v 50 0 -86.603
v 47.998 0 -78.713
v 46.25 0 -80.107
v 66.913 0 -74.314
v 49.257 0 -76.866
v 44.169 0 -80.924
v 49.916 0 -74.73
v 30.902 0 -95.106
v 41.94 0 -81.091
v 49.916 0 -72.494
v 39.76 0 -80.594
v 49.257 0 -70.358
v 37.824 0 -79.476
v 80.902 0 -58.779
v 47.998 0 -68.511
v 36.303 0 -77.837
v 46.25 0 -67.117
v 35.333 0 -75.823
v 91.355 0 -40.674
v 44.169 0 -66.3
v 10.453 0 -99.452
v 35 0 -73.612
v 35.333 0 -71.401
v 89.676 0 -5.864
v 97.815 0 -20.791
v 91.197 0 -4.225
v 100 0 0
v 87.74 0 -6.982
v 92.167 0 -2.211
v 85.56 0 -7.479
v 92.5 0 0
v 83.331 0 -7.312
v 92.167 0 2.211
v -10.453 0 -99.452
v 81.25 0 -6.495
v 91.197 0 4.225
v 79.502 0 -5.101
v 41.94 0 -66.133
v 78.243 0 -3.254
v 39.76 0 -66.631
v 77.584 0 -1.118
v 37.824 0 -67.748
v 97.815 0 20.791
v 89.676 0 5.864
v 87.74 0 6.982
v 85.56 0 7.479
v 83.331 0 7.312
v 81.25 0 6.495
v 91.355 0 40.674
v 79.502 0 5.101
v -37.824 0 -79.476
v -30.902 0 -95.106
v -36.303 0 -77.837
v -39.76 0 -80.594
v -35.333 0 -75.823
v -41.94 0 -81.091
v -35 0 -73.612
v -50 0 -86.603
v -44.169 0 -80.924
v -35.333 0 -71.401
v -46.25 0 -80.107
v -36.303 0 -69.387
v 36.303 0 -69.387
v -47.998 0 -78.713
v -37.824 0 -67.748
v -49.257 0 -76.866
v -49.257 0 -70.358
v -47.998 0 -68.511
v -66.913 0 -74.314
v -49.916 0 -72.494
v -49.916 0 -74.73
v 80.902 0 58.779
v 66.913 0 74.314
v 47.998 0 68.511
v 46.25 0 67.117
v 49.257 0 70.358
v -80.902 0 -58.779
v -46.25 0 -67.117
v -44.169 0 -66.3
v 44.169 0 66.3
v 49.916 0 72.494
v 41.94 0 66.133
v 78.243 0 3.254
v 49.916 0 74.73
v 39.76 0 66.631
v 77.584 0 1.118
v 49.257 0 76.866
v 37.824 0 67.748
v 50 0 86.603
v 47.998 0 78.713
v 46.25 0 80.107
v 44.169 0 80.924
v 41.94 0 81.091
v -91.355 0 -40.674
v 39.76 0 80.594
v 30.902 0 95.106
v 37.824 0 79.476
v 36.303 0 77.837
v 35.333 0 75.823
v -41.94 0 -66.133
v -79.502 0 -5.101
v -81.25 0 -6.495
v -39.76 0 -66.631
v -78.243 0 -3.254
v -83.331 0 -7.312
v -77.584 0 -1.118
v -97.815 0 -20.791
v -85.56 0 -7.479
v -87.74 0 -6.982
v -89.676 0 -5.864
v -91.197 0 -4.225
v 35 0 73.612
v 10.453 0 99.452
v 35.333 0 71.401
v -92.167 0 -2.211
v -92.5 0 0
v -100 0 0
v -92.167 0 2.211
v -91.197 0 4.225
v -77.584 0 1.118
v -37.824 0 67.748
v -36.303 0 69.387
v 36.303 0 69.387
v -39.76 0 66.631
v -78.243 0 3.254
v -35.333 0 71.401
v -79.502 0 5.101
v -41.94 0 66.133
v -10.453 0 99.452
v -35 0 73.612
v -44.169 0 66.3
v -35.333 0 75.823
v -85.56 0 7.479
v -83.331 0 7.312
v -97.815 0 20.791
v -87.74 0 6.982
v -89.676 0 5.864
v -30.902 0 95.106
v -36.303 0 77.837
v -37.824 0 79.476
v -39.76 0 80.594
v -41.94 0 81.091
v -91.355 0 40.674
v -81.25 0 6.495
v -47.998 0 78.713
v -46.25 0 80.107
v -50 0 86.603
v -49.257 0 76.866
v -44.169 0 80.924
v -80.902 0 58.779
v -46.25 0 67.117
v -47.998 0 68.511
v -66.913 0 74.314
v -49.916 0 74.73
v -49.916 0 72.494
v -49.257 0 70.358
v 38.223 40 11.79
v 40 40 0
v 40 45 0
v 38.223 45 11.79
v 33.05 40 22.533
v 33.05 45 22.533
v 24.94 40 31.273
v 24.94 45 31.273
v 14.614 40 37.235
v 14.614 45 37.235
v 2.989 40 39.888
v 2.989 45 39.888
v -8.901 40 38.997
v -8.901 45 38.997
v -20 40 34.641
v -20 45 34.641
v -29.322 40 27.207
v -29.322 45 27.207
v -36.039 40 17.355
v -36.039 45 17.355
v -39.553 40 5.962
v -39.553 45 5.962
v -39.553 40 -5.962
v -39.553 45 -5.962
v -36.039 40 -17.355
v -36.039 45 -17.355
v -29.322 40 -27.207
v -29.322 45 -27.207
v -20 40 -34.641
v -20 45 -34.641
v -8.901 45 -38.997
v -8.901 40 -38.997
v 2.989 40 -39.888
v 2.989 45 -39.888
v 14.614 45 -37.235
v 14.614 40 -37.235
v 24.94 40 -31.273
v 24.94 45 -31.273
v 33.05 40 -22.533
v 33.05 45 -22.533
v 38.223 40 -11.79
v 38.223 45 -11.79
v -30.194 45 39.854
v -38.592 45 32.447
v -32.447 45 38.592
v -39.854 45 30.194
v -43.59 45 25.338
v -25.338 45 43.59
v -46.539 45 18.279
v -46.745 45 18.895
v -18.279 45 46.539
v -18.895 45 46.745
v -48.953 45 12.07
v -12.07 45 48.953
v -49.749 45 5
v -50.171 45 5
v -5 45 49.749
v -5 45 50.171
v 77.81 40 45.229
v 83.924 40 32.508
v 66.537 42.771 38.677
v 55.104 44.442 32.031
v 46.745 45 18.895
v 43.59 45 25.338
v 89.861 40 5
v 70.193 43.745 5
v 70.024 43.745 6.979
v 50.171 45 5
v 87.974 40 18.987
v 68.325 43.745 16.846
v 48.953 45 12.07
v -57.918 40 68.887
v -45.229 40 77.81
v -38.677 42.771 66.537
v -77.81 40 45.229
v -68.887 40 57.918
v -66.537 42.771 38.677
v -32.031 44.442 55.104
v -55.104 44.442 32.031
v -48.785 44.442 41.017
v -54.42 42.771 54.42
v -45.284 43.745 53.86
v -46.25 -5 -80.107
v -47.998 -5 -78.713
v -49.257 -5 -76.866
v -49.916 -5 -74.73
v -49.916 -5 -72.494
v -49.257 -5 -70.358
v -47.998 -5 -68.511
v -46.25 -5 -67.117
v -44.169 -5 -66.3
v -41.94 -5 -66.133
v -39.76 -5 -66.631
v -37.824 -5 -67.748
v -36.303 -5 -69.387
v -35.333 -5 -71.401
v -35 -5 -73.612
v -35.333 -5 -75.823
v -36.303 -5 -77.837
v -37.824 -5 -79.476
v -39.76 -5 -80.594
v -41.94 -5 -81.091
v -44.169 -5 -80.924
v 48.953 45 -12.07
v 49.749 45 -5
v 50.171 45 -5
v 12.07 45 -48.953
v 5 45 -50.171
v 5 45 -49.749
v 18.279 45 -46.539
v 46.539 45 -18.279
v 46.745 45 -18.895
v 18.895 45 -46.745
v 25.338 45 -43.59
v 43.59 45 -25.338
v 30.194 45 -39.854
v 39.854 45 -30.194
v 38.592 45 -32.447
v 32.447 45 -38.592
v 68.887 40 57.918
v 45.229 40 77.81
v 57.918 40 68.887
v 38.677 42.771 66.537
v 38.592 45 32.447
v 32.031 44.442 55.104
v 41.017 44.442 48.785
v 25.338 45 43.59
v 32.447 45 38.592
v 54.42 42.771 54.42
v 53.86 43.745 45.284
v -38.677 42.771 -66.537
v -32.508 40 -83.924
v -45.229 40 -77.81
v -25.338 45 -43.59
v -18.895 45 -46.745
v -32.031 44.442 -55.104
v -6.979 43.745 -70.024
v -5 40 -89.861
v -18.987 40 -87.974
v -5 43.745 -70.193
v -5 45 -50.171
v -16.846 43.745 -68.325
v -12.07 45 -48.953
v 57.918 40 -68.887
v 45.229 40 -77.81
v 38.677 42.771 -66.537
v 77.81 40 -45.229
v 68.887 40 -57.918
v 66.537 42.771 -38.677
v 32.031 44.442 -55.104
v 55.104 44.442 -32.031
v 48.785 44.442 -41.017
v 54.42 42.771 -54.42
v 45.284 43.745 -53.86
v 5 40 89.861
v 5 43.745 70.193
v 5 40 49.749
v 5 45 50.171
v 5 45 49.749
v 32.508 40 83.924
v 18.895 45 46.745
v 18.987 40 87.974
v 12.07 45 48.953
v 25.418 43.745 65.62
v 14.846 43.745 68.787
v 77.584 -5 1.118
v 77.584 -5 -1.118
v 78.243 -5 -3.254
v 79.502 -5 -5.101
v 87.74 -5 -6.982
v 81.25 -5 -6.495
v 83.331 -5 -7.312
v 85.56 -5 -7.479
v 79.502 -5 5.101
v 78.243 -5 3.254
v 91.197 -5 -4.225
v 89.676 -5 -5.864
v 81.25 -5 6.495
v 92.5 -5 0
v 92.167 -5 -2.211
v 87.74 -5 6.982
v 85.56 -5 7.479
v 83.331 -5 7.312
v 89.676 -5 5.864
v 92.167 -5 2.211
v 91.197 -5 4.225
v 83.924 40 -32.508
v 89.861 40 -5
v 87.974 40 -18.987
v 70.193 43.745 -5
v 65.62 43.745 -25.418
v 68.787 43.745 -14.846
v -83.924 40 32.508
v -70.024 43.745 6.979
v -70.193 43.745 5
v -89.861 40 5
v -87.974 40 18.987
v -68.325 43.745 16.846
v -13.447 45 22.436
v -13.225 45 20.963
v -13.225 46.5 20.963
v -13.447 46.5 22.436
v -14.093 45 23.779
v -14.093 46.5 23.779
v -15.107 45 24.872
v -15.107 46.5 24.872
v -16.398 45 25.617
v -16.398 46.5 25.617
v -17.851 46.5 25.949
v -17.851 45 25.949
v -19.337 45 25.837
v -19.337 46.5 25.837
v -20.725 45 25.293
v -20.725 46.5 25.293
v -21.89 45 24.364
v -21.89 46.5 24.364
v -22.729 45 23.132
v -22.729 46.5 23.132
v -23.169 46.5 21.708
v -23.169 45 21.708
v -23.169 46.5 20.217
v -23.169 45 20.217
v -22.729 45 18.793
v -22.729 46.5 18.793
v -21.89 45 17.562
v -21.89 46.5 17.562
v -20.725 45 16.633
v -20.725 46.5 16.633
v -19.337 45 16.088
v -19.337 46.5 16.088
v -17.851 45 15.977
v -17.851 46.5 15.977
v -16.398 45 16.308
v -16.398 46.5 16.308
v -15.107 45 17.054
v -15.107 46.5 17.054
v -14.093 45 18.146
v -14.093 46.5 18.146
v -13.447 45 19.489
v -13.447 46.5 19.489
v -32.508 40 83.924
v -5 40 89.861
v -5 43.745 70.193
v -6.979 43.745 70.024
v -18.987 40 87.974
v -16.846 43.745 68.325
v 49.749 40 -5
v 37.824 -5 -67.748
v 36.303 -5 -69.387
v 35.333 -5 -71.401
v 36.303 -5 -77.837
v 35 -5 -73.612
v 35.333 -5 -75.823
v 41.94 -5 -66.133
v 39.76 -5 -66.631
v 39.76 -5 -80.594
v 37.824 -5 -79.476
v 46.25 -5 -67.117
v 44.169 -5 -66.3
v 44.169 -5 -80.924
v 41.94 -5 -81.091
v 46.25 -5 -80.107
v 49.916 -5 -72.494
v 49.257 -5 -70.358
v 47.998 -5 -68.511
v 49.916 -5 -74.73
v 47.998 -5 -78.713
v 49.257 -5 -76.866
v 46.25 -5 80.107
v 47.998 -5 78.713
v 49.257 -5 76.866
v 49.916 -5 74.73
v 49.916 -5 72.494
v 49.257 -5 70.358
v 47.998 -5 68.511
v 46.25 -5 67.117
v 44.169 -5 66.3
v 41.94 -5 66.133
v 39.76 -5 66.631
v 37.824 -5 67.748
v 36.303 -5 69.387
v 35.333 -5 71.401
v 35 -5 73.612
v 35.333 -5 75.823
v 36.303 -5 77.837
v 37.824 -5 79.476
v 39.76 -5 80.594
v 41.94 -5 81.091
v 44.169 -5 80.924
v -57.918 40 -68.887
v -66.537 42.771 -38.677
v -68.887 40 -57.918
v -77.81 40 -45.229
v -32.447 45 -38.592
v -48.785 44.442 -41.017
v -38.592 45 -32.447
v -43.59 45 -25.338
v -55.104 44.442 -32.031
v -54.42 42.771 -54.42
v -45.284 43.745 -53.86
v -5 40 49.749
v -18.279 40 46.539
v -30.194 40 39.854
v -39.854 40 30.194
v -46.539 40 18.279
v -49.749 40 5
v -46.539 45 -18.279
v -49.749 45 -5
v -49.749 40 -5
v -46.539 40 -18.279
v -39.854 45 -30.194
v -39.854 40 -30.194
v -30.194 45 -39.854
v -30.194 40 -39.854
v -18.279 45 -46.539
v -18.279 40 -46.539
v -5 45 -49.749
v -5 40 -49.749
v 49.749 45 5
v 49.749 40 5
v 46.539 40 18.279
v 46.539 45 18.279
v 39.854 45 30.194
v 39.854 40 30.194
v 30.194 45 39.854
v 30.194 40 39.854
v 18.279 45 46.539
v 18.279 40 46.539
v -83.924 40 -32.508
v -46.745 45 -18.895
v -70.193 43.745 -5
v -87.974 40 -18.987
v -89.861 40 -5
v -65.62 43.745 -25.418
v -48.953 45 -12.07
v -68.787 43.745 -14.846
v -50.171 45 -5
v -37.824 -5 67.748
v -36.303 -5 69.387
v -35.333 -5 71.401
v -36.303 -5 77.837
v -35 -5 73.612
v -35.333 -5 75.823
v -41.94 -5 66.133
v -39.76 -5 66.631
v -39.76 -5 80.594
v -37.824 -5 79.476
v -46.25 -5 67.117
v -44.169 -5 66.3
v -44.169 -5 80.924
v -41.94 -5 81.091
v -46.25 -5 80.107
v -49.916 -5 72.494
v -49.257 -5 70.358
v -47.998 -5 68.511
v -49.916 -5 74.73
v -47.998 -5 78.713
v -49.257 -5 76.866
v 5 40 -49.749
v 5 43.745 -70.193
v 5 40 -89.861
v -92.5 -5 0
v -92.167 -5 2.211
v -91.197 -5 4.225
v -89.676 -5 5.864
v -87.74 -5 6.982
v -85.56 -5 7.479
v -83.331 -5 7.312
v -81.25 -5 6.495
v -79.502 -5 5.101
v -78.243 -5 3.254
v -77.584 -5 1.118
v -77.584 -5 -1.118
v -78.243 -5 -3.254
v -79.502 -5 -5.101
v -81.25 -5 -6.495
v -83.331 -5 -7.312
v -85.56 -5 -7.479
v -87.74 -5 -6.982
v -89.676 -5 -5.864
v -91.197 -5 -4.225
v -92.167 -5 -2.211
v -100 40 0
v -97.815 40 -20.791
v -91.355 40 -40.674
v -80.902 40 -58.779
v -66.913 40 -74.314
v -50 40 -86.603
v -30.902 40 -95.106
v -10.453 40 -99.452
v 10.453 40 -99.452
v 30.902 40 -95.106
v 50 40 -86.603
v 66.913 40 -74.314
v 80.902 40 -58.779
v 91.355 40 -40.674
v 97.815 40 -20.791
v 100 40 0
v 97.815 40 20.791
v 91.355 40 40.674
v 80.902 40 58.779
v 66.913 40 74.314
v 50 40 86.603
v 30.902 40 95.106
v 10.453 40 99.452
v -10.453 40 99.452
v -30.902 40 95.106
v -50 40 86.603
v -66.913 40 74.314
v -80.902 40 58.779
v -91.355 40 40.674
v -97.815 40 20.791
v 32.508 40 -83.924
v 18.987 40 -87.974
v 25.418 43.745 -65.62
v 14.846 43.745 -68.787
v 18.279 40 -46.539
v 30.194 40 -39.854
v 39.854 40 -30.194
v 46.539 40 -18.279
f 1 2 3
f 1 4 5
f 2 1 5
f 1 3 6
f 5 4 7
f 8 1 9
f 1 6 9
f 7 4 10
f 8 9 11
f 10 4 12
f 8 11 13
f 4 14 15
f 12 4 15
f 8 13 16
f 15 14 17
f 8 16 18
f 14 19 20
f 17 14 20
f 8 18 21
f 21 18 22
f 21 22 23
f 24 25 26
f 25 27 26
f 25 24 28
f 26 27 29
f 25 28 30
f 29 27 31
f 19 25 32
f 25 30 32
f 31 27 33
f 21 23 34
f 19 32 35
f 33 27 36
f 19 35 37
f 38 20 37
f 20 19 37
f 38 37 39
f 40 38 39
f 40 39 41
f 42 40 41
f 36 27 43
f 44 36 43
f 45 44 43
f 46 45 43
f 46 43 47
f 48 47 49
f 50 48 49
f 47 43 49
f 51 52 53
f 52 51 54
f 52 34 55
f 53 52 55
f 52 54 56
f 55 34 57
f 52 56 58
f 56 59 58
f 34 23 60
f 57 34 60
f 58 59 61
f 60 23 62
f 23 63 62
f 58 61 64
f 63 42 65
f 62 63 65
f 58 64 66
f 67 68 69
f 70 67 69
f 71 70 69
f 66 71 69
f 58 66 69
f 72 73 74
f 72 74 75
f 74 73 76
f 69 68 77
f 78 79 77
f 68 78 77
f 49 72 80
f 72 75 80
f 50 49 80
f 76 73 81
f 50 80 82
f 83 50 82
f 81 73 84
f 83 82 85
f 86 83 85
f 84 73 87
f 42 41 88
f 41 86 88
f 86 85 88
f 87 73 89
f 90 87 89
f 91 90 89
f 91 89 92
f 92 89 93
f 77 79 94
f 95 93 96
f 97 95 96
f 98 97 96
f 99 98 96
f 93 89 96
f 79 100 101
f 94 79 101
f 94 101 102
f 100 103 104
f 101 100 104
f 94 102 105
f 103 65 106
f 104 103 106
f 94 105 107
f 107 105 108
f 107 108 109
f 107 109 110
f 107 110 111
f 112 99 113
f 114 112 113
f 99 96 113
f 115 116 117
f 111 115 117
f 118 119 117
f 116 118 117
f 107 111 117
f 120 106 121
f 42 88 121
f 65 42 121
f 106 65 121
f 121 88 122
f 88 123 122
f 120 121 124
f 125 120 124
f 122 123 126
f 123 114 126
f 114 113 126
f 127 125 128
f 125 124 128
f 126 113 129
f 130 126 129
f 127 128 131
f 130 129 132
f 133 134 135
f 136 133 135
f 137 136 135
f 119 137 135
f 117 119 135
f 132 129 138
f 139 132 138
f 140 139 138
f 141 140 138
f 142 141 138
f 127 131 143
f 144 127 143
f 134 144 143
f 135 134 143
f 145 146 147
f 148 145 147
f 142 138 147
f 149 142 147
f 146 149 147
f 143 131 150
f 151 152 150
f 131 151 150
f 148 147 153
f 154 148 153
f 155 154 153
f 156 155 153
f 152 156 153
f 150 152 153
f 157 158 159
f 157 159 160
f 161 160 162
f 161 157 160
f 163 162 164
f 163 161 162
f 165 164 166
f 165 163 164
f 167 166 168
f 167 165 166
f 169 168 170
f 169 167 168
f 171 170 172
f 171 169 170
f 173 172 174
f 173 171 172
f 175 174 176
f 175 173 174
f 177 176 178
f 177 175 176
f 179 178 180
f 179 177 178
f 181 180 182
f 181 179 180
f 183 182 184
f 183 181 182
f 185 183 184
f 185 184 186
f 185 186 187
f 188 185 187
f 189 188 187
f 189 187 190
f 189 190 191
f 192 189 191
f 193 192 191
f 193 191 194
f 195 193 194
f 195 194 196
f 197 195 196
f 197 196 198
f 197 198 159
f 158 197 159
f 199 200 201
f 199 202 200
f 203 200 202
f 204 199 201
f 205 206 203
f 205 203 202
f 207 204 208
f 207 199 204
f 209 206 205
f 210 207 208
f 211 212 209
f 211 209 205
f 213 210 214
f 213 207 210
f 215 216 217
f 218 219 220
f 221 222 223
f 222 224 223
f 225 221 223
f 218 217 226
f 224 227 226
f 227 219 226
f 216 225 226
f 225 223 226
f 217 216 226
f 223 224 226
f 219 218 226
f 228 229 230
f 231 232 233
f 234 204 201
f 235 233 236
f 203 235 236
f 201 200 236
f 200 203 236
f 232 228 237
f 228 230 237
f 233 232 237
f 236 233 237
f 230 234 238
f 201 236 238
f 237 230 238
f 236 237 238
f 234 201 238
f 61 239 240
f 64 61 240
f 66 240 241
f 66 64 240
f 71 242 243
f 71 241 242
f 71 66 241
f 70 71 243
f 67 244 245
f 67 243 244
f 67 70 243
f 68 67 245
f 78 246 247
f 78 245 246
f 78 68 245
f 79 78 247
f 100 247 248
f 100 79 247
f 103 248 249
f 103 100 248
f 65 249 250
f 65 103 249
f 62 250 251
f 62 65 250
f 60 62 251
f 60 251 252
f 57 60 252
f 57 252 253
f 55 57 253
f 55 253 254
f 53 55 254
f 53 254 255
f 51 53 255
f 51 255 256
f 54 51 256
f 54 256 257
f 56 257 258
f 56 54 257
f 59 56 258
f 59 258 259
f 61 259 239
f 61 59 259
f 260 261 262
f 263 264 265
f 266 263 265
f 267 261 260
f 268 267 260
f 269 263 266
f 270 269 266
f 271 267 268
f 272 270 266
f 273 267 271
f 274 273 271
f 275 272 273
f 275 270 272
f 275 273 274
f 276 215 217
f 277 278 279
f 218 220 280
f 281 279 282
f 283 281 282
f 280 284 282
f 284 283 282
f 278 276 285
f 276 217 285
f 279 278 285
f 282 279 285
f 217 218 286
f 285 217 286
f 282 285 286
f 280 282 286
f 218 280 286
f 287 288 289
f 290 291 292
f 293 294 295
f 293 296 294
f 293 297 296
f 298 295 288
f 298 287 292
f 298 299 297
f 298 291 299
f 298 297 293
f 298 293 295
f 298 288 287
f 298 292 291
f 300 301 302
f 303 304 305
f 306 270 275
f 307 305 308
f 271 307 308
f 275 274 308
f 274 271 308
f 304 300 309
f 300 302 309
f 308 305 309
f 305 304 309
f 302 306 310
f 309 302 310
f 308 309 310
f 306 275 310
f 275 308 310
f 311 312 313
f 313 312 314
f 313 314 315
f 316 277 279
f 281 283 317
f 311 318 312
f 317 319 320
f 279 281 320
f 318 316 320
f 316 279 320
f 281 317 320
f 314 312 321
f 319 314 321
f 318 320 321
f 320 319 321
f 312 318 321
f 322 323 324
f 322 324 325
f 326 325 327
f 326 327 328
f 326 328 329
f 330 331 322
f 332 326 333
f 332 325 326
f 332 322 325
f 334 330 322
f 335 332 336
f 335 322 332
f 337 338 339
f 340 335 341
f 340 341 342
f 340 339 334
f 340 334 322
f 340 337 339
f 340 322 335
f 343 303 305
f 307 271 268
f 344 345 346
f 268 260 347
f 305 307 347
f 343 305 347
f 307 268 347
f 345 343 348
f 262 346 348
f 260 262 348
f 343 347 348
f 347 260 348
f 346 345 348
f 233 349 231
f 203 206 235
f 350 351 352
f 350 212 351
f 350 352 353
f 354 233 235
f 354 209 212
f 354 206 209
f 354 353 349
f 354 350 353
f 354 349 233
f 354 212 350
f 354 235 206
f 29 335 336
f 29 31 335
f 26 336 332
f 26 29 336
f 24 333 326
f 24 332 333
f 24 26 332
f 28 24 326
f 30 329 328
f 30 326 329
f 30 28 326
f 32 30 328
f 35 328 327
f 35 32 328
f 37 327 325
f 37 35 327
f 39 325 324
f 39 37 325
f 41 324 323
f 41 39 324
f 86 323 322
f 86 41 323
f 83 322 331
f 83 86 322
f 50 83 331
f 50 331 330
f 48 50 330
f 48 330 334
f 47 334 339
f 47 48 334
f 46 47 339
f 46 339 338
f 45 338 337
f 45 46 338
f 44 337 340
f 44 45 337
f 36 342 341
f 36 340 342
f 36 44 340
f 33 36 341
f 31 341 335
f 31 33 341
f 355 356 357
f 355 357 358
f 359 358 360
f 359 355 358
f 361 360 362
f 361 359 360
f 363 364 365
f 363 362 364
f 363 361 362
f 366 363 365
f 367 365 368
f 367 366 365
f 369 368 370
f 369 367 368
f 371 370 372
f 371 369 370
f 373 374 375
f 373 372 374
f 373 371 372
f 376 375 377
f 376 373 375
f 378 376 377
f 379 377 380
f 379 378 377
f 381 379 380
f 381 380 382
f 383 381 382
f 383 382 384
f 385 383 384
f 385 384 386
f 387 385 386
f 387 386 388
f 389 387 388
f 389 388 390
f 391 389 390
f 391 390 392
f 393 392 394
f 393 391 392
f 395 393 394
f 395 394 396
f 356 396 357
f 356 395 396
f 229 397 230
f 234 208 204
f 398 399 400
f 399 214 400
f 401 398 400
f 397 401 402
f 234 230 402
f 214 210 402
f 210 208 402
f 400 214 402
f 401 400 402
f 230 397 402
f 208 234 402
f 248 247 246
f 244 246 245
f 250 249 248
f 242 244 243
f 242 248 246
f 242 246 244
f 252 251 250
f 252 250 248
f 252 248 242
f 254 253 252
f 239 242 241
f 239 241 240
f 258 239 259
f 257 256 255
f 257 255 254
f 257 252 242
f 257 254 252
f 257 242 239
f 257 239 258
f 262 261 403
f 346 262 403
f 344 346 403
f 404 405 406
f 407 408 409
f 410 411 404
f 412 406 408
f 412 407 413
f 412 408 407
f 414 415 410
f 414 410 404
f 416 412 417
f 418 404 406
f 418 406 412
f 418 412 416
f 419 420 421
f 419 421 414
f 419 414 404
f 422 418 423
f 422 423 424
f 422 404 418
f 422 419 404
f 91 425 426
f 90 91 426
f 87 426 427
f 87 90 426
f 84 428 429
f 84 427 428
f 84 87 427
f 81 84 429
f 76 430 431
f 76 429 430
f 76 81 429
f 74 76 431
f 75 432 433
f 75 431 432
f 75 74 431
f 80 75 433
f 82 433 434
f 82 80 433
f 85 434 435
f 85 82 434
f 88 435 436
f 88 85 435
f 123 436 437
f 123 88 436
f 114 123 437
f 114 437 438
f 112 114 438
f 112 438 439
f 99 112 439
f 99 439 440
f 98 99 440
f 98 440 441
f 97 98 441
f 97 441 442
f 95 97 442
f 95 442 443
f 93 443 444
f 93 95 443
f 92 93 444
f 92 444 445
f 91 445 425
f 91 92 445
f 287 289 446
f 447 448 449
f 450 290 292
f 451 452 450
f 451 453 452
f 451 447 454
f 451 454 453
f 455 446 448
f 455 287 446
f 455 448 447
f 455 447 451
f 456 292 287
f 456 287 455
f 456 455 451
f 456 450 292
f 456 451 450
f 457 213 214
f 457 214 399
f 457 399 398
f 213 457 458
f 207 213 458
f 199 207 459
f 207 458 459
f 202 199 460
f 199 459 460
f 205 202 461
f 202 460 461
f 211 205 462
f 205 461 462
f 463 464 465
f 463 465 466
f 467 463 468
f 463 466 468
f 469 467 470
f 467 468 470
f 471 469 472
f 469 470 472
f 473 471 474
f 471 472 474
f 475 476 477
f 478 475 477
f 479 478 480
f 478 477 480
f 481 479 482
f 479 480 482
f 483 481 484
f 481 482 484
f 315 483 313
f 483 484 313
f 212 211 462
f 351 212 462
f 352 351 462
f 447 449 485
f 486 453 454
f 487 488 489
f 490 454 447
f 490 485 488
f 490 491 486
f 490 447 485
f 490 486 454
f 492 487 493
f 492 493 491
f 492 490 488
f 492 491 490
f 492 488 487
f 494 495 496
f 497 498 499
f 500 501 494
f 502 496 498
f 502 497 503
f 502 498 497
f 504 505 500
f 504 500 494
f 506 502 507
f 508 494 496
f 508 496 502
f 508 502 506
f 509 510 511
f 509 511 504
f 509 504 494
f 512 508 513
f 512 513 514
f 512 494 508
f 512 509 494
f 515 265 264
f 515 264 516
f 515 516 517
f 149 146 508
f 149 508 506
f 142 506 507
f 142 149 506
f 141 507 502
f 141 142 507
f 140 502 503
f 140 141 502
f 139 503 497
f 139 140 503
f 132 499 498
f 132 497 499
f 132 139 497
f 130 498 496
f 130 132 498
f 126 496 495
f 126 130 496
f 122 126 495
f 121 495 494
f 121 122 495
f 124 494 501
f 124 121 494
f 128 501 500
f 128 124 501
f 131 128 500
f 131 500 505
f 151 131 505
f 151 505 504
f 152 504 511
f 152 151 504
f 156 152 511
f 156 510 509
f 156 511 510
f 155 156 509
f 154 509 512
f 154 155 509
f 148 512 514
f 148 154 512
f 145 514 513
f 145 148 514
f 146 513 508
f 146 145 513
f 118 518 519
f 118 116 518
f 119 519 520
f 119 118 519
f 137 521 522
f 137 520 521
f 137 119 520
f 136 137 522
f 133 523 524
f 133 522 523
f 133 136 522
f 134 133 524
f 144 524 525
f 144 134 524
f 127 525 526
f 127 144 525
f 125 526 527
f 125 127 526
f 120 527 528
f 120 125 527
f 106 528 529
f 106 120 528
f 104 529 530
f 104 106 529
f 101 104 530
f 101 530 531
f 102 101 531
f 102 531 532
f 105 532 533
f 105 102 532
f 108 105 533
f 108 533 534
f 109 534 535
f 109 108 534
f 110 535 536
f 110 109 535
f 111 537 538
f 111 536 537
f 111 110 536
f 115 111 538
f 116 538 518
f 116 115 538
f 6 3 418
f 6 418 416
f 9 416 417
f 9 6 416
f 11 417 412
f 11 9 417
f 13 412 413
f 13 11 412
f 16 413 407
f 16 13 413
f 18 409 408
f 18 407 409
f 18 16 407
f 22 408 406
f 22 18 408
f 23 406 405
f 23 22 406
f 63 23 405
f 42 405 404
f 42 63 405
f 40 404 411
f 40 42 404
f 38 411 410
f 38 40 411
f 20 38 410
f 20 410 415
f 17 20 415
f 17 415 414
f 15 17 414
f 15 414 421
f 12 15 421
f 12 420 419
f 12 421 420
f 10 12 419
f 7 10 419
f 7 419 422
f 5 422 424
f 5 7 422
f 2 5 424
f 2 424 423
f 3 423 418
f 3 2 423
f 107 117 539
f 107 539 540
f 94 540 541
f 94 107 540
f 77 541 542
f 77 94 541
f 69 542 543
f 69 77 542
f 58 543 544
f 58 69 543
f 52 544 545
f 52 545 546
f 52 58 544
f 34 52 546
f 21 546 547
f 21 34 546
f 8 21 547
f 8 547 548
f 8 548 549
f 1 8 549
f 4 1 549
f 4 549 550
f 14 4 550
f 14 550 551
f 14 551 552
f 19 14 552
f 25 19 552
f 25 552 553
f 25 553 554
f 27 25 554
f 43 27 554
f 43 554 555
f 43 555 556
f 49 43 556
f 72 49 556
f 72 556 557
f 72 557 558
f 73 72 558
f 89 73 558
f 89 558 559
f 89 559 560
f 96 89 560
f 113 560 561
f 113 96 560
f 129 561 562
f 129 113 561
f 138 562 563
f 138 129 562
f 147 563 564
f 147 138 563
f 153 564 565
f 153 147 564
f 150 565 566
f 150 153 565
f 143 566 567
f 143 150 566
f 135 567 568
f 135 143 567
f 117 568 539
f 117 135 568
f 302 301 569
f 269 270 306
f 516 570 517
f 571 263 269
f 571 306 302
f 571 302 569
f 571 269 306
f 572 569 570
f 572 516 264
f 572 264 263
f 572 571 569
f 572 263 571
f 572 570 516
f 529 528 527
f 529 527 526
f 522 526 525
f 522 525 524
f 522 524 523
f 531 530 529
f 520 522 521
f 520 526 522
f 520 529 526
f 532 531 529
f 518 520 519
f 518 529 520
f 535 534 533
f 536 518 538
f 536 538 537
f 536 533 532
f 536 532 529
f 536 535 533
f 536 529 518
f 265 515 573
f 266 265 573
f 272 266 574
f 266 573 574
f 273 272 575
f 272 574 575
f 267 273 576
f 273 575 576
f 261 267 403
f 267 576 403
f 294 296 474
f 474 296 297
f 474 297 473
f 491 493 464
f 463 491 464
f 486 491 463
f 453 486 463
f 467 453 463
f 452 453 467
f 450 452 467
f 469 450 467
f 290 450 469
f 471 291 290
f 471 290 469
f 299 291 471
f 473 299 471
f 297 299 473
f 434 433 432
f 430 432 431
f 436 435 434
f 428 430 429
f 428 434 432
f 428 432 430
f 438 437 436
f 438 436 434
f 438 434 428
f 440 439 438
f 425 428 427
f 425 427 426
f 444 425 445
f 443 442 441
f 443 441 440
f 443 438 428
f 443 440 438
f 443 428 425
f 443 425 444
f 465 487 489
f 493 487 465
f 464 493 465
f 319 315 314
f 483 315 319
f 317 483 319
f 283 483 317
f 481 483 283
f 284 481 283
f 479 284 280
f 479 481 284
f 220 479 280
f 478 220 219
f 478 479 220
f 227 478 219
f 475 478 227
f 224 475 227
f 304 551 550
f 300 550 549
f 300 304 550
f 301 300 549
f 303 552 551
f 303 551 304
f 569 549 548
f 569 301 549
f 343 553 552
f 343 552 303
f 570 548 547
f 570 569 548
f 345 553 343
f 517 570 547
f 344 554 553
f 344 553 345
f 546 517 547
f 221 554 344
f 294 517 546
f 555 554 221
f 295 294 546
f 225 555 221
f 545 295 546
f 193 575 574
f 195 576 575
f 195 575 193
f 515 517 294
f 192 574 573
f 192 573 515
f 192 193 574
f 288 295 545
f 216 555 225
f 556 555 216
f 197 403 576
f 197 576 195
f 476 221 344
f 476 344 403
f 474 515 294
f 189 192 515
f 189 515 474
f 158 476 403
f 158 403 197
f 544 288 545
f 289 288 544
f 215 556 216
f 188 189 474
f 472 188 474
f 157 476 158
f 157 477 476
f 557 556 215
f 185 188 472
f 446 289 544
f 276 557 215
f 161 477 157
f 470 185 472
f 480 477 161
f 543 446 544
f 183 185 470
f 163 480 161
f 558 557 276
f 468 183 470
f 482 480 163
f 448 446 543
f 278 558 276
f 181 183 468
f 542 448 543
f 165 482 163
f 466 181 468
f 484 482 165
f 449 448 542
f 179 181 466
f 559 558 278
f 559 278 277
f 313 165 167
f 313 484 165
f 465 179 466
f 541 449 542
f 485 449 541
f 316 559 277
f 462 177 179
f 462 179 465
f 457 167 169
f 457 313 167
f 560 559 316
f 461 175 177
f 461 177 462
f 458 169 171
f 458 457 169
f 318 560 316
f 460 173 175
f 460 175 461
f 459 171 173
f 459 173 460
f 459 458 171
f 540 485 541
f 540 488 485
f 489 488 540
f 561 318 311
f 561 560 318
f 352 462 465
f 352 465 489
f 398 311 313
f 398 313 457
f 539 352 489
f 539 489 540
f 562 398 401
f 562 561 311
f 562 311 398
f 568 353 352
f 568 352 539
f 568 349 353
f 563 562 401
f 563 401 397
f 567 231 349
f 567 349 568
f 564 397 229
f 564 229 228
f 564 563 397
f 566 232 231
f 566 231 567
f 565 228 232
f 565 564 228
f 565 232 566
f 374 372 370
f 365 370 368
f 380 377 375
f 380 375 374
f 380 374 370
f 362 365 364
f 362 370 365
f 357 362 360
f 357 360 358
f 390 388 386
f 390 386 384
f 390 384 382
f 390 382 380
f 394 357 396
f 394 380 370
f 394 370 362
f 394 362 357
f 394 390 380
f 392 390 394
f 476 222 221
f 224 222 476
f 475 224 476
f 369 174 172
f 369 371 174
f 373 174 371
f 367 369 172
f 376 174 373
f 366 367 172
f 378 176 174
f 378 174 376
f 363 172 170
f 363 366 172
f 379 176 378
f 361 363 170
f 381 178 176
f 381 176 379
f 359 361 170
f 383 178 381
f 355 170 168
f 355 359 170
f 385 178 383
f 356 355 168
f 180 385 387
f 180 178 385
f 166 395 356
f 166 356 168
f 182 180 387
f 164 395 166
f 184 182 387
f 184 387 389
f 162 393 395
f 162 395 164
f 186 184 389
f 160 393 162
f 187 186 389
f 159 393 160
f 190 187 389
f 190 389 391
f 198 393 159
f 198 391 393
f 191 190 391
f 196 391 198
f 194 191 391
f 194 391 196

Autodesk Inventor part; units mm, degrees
ref_plane "YZ Plane" through (0, 0, 0) normal (1, 0, 0) x (0, 1, 0)
ref_plane "XZ Plane" through (0, 0, 0) normal (0, 1, 0) x (-1, 0, 0)
ref_plane "XY Plane" through (0, 0, 0) normal (0, 0, 1) x (1, 0, 0)
sketch "Sketch1" plane through (0, 0, 0) normal (0, 1, 0) x (-1, 0, 0)
  circle A0 centre (0, 0) radius 100
  dimension "d0" = 200
extrude "Extrusion1" add sketch "Sketch1" along normal blind 40
sketch "Sketch2" plane through (0, 40, 0) normal (0, 1, 0) x (1, 0, 0)
  circle A0 centre (0, 0) radius 90
  dimension "d3" = 180
extrude "Extrusion2" add sketch "Sketch2" along normal blind 5
sketch "Sketch3" plane through (0, 45, 0) normal (0, 1, 0) x (1, 0, 0)
  point P0 (0, 0)
sketch "Sketch4" plane through (0, 45, 0) normal (0, 1, 0) x (1, 0, 0)
  point P0 (0, 0)
sketch "Sketch5" plane through (0, 45, 0) normal (0, 1, 0) x (1, 0, 0)
  line L0 (-5, -90) -> (5, -90)
  line L1 (5, -90) -> (5, 90)
  line L2 (5, 90) -> (-5, 90)
  line L3 (-5, 90) -> (-5, -90)
  line L4 (-5, -90) -> (5, 90) construction
  line L5 (5, -90) -> (-5, 90) construction
  point P0 (0, 0)
  dimension "d6" = 10
  dimension "d7" = 180
extrude "Extrusion3" cut sketch "Sketch5" against normal blind 5
sketch "Sketch6" plane through (0, 45, 0) normal (0, 1, 0) x (1, 0, 0)
  line L0 (-90, 5) -> (90, 5)
  line L1 (90, 5) -> (90, -5)
  line L2 (90, -5) -> (-90, -5)
  line L3 (-90, -5) -> (-90, 5)
  line L4 (-90, 5) -> (90, -5) construction
  line L5 (90, 5) -> (-90, -5) construction
  point P0 (0, 0)
  dimension "d10" = 180
  dimension "d11" = 10
extrude "Extrusion4" cut sketch "Sketch6" against normal blind 5
sketch "Sketch7" plane through (0, 40, 0) normal (0, 1, 0) x (1, 0, 0)
  point P0 (0, 0)
sketch "Sketch8" plane through (0, 40, 0) normal (0, 1, 0) x (1, 0, 0)
  circle A0 centre (0, 0) radius 50
  dimension "d14" = 100
extrude "Extrusion6" cut sketch "Sketch8" along normal blind 10
sketch "Sketch10" plane through (0, 40, 0) normal (0, 1, 0) x (1, 0, 0)
  circle A0 centre (0, 0) radius 40
  dimension "d20" = 80
extrude "Extrusion7" add sketch "Sketch10" along normal blind 5
sketch "Sketch11" plane through (0, 0, 0) normal (0, -1, 0) x (1, 0, 0)
  circle A0 centre (85, 0) radius 7.5
  point P0 (0, 0)
  dimension "d23" = 15
extrude "Extrusion8" add sketch "Sketch11" along normal blind 5
pattern_circular "Circular Pattern1" count 6 over 360 about axis through (0, 0, 0) along (0, 1, 0) of "Extrusion8", "Extrusion1", "Extrusion7"
fillet "Fillet1" radius 159.1625 4 edges at (63.6396, 45, 63.6396) (-63.6396, 45, 63.6396) (-63.6396, 45, -63.6396) (63.6396, 45, -63.6396)
sketch "Sketch12" plane through (0, 45, 0) normal (0, 1, 0) x (1, 0, 0)
  point P0 (0, 0)
sketch "Sketch13" plane through (0, 45, 0) normal (0, 1, 0) x (1, 0, 0)
  circle A0 centre (-18.2246, -20.9627) radius 5
  point P0 (0, 0)
  dimension "d30" = 10
extrude "Extrusion9" add sketch "Sketch13" along normal mid plane 3
properties part number "Simon"
